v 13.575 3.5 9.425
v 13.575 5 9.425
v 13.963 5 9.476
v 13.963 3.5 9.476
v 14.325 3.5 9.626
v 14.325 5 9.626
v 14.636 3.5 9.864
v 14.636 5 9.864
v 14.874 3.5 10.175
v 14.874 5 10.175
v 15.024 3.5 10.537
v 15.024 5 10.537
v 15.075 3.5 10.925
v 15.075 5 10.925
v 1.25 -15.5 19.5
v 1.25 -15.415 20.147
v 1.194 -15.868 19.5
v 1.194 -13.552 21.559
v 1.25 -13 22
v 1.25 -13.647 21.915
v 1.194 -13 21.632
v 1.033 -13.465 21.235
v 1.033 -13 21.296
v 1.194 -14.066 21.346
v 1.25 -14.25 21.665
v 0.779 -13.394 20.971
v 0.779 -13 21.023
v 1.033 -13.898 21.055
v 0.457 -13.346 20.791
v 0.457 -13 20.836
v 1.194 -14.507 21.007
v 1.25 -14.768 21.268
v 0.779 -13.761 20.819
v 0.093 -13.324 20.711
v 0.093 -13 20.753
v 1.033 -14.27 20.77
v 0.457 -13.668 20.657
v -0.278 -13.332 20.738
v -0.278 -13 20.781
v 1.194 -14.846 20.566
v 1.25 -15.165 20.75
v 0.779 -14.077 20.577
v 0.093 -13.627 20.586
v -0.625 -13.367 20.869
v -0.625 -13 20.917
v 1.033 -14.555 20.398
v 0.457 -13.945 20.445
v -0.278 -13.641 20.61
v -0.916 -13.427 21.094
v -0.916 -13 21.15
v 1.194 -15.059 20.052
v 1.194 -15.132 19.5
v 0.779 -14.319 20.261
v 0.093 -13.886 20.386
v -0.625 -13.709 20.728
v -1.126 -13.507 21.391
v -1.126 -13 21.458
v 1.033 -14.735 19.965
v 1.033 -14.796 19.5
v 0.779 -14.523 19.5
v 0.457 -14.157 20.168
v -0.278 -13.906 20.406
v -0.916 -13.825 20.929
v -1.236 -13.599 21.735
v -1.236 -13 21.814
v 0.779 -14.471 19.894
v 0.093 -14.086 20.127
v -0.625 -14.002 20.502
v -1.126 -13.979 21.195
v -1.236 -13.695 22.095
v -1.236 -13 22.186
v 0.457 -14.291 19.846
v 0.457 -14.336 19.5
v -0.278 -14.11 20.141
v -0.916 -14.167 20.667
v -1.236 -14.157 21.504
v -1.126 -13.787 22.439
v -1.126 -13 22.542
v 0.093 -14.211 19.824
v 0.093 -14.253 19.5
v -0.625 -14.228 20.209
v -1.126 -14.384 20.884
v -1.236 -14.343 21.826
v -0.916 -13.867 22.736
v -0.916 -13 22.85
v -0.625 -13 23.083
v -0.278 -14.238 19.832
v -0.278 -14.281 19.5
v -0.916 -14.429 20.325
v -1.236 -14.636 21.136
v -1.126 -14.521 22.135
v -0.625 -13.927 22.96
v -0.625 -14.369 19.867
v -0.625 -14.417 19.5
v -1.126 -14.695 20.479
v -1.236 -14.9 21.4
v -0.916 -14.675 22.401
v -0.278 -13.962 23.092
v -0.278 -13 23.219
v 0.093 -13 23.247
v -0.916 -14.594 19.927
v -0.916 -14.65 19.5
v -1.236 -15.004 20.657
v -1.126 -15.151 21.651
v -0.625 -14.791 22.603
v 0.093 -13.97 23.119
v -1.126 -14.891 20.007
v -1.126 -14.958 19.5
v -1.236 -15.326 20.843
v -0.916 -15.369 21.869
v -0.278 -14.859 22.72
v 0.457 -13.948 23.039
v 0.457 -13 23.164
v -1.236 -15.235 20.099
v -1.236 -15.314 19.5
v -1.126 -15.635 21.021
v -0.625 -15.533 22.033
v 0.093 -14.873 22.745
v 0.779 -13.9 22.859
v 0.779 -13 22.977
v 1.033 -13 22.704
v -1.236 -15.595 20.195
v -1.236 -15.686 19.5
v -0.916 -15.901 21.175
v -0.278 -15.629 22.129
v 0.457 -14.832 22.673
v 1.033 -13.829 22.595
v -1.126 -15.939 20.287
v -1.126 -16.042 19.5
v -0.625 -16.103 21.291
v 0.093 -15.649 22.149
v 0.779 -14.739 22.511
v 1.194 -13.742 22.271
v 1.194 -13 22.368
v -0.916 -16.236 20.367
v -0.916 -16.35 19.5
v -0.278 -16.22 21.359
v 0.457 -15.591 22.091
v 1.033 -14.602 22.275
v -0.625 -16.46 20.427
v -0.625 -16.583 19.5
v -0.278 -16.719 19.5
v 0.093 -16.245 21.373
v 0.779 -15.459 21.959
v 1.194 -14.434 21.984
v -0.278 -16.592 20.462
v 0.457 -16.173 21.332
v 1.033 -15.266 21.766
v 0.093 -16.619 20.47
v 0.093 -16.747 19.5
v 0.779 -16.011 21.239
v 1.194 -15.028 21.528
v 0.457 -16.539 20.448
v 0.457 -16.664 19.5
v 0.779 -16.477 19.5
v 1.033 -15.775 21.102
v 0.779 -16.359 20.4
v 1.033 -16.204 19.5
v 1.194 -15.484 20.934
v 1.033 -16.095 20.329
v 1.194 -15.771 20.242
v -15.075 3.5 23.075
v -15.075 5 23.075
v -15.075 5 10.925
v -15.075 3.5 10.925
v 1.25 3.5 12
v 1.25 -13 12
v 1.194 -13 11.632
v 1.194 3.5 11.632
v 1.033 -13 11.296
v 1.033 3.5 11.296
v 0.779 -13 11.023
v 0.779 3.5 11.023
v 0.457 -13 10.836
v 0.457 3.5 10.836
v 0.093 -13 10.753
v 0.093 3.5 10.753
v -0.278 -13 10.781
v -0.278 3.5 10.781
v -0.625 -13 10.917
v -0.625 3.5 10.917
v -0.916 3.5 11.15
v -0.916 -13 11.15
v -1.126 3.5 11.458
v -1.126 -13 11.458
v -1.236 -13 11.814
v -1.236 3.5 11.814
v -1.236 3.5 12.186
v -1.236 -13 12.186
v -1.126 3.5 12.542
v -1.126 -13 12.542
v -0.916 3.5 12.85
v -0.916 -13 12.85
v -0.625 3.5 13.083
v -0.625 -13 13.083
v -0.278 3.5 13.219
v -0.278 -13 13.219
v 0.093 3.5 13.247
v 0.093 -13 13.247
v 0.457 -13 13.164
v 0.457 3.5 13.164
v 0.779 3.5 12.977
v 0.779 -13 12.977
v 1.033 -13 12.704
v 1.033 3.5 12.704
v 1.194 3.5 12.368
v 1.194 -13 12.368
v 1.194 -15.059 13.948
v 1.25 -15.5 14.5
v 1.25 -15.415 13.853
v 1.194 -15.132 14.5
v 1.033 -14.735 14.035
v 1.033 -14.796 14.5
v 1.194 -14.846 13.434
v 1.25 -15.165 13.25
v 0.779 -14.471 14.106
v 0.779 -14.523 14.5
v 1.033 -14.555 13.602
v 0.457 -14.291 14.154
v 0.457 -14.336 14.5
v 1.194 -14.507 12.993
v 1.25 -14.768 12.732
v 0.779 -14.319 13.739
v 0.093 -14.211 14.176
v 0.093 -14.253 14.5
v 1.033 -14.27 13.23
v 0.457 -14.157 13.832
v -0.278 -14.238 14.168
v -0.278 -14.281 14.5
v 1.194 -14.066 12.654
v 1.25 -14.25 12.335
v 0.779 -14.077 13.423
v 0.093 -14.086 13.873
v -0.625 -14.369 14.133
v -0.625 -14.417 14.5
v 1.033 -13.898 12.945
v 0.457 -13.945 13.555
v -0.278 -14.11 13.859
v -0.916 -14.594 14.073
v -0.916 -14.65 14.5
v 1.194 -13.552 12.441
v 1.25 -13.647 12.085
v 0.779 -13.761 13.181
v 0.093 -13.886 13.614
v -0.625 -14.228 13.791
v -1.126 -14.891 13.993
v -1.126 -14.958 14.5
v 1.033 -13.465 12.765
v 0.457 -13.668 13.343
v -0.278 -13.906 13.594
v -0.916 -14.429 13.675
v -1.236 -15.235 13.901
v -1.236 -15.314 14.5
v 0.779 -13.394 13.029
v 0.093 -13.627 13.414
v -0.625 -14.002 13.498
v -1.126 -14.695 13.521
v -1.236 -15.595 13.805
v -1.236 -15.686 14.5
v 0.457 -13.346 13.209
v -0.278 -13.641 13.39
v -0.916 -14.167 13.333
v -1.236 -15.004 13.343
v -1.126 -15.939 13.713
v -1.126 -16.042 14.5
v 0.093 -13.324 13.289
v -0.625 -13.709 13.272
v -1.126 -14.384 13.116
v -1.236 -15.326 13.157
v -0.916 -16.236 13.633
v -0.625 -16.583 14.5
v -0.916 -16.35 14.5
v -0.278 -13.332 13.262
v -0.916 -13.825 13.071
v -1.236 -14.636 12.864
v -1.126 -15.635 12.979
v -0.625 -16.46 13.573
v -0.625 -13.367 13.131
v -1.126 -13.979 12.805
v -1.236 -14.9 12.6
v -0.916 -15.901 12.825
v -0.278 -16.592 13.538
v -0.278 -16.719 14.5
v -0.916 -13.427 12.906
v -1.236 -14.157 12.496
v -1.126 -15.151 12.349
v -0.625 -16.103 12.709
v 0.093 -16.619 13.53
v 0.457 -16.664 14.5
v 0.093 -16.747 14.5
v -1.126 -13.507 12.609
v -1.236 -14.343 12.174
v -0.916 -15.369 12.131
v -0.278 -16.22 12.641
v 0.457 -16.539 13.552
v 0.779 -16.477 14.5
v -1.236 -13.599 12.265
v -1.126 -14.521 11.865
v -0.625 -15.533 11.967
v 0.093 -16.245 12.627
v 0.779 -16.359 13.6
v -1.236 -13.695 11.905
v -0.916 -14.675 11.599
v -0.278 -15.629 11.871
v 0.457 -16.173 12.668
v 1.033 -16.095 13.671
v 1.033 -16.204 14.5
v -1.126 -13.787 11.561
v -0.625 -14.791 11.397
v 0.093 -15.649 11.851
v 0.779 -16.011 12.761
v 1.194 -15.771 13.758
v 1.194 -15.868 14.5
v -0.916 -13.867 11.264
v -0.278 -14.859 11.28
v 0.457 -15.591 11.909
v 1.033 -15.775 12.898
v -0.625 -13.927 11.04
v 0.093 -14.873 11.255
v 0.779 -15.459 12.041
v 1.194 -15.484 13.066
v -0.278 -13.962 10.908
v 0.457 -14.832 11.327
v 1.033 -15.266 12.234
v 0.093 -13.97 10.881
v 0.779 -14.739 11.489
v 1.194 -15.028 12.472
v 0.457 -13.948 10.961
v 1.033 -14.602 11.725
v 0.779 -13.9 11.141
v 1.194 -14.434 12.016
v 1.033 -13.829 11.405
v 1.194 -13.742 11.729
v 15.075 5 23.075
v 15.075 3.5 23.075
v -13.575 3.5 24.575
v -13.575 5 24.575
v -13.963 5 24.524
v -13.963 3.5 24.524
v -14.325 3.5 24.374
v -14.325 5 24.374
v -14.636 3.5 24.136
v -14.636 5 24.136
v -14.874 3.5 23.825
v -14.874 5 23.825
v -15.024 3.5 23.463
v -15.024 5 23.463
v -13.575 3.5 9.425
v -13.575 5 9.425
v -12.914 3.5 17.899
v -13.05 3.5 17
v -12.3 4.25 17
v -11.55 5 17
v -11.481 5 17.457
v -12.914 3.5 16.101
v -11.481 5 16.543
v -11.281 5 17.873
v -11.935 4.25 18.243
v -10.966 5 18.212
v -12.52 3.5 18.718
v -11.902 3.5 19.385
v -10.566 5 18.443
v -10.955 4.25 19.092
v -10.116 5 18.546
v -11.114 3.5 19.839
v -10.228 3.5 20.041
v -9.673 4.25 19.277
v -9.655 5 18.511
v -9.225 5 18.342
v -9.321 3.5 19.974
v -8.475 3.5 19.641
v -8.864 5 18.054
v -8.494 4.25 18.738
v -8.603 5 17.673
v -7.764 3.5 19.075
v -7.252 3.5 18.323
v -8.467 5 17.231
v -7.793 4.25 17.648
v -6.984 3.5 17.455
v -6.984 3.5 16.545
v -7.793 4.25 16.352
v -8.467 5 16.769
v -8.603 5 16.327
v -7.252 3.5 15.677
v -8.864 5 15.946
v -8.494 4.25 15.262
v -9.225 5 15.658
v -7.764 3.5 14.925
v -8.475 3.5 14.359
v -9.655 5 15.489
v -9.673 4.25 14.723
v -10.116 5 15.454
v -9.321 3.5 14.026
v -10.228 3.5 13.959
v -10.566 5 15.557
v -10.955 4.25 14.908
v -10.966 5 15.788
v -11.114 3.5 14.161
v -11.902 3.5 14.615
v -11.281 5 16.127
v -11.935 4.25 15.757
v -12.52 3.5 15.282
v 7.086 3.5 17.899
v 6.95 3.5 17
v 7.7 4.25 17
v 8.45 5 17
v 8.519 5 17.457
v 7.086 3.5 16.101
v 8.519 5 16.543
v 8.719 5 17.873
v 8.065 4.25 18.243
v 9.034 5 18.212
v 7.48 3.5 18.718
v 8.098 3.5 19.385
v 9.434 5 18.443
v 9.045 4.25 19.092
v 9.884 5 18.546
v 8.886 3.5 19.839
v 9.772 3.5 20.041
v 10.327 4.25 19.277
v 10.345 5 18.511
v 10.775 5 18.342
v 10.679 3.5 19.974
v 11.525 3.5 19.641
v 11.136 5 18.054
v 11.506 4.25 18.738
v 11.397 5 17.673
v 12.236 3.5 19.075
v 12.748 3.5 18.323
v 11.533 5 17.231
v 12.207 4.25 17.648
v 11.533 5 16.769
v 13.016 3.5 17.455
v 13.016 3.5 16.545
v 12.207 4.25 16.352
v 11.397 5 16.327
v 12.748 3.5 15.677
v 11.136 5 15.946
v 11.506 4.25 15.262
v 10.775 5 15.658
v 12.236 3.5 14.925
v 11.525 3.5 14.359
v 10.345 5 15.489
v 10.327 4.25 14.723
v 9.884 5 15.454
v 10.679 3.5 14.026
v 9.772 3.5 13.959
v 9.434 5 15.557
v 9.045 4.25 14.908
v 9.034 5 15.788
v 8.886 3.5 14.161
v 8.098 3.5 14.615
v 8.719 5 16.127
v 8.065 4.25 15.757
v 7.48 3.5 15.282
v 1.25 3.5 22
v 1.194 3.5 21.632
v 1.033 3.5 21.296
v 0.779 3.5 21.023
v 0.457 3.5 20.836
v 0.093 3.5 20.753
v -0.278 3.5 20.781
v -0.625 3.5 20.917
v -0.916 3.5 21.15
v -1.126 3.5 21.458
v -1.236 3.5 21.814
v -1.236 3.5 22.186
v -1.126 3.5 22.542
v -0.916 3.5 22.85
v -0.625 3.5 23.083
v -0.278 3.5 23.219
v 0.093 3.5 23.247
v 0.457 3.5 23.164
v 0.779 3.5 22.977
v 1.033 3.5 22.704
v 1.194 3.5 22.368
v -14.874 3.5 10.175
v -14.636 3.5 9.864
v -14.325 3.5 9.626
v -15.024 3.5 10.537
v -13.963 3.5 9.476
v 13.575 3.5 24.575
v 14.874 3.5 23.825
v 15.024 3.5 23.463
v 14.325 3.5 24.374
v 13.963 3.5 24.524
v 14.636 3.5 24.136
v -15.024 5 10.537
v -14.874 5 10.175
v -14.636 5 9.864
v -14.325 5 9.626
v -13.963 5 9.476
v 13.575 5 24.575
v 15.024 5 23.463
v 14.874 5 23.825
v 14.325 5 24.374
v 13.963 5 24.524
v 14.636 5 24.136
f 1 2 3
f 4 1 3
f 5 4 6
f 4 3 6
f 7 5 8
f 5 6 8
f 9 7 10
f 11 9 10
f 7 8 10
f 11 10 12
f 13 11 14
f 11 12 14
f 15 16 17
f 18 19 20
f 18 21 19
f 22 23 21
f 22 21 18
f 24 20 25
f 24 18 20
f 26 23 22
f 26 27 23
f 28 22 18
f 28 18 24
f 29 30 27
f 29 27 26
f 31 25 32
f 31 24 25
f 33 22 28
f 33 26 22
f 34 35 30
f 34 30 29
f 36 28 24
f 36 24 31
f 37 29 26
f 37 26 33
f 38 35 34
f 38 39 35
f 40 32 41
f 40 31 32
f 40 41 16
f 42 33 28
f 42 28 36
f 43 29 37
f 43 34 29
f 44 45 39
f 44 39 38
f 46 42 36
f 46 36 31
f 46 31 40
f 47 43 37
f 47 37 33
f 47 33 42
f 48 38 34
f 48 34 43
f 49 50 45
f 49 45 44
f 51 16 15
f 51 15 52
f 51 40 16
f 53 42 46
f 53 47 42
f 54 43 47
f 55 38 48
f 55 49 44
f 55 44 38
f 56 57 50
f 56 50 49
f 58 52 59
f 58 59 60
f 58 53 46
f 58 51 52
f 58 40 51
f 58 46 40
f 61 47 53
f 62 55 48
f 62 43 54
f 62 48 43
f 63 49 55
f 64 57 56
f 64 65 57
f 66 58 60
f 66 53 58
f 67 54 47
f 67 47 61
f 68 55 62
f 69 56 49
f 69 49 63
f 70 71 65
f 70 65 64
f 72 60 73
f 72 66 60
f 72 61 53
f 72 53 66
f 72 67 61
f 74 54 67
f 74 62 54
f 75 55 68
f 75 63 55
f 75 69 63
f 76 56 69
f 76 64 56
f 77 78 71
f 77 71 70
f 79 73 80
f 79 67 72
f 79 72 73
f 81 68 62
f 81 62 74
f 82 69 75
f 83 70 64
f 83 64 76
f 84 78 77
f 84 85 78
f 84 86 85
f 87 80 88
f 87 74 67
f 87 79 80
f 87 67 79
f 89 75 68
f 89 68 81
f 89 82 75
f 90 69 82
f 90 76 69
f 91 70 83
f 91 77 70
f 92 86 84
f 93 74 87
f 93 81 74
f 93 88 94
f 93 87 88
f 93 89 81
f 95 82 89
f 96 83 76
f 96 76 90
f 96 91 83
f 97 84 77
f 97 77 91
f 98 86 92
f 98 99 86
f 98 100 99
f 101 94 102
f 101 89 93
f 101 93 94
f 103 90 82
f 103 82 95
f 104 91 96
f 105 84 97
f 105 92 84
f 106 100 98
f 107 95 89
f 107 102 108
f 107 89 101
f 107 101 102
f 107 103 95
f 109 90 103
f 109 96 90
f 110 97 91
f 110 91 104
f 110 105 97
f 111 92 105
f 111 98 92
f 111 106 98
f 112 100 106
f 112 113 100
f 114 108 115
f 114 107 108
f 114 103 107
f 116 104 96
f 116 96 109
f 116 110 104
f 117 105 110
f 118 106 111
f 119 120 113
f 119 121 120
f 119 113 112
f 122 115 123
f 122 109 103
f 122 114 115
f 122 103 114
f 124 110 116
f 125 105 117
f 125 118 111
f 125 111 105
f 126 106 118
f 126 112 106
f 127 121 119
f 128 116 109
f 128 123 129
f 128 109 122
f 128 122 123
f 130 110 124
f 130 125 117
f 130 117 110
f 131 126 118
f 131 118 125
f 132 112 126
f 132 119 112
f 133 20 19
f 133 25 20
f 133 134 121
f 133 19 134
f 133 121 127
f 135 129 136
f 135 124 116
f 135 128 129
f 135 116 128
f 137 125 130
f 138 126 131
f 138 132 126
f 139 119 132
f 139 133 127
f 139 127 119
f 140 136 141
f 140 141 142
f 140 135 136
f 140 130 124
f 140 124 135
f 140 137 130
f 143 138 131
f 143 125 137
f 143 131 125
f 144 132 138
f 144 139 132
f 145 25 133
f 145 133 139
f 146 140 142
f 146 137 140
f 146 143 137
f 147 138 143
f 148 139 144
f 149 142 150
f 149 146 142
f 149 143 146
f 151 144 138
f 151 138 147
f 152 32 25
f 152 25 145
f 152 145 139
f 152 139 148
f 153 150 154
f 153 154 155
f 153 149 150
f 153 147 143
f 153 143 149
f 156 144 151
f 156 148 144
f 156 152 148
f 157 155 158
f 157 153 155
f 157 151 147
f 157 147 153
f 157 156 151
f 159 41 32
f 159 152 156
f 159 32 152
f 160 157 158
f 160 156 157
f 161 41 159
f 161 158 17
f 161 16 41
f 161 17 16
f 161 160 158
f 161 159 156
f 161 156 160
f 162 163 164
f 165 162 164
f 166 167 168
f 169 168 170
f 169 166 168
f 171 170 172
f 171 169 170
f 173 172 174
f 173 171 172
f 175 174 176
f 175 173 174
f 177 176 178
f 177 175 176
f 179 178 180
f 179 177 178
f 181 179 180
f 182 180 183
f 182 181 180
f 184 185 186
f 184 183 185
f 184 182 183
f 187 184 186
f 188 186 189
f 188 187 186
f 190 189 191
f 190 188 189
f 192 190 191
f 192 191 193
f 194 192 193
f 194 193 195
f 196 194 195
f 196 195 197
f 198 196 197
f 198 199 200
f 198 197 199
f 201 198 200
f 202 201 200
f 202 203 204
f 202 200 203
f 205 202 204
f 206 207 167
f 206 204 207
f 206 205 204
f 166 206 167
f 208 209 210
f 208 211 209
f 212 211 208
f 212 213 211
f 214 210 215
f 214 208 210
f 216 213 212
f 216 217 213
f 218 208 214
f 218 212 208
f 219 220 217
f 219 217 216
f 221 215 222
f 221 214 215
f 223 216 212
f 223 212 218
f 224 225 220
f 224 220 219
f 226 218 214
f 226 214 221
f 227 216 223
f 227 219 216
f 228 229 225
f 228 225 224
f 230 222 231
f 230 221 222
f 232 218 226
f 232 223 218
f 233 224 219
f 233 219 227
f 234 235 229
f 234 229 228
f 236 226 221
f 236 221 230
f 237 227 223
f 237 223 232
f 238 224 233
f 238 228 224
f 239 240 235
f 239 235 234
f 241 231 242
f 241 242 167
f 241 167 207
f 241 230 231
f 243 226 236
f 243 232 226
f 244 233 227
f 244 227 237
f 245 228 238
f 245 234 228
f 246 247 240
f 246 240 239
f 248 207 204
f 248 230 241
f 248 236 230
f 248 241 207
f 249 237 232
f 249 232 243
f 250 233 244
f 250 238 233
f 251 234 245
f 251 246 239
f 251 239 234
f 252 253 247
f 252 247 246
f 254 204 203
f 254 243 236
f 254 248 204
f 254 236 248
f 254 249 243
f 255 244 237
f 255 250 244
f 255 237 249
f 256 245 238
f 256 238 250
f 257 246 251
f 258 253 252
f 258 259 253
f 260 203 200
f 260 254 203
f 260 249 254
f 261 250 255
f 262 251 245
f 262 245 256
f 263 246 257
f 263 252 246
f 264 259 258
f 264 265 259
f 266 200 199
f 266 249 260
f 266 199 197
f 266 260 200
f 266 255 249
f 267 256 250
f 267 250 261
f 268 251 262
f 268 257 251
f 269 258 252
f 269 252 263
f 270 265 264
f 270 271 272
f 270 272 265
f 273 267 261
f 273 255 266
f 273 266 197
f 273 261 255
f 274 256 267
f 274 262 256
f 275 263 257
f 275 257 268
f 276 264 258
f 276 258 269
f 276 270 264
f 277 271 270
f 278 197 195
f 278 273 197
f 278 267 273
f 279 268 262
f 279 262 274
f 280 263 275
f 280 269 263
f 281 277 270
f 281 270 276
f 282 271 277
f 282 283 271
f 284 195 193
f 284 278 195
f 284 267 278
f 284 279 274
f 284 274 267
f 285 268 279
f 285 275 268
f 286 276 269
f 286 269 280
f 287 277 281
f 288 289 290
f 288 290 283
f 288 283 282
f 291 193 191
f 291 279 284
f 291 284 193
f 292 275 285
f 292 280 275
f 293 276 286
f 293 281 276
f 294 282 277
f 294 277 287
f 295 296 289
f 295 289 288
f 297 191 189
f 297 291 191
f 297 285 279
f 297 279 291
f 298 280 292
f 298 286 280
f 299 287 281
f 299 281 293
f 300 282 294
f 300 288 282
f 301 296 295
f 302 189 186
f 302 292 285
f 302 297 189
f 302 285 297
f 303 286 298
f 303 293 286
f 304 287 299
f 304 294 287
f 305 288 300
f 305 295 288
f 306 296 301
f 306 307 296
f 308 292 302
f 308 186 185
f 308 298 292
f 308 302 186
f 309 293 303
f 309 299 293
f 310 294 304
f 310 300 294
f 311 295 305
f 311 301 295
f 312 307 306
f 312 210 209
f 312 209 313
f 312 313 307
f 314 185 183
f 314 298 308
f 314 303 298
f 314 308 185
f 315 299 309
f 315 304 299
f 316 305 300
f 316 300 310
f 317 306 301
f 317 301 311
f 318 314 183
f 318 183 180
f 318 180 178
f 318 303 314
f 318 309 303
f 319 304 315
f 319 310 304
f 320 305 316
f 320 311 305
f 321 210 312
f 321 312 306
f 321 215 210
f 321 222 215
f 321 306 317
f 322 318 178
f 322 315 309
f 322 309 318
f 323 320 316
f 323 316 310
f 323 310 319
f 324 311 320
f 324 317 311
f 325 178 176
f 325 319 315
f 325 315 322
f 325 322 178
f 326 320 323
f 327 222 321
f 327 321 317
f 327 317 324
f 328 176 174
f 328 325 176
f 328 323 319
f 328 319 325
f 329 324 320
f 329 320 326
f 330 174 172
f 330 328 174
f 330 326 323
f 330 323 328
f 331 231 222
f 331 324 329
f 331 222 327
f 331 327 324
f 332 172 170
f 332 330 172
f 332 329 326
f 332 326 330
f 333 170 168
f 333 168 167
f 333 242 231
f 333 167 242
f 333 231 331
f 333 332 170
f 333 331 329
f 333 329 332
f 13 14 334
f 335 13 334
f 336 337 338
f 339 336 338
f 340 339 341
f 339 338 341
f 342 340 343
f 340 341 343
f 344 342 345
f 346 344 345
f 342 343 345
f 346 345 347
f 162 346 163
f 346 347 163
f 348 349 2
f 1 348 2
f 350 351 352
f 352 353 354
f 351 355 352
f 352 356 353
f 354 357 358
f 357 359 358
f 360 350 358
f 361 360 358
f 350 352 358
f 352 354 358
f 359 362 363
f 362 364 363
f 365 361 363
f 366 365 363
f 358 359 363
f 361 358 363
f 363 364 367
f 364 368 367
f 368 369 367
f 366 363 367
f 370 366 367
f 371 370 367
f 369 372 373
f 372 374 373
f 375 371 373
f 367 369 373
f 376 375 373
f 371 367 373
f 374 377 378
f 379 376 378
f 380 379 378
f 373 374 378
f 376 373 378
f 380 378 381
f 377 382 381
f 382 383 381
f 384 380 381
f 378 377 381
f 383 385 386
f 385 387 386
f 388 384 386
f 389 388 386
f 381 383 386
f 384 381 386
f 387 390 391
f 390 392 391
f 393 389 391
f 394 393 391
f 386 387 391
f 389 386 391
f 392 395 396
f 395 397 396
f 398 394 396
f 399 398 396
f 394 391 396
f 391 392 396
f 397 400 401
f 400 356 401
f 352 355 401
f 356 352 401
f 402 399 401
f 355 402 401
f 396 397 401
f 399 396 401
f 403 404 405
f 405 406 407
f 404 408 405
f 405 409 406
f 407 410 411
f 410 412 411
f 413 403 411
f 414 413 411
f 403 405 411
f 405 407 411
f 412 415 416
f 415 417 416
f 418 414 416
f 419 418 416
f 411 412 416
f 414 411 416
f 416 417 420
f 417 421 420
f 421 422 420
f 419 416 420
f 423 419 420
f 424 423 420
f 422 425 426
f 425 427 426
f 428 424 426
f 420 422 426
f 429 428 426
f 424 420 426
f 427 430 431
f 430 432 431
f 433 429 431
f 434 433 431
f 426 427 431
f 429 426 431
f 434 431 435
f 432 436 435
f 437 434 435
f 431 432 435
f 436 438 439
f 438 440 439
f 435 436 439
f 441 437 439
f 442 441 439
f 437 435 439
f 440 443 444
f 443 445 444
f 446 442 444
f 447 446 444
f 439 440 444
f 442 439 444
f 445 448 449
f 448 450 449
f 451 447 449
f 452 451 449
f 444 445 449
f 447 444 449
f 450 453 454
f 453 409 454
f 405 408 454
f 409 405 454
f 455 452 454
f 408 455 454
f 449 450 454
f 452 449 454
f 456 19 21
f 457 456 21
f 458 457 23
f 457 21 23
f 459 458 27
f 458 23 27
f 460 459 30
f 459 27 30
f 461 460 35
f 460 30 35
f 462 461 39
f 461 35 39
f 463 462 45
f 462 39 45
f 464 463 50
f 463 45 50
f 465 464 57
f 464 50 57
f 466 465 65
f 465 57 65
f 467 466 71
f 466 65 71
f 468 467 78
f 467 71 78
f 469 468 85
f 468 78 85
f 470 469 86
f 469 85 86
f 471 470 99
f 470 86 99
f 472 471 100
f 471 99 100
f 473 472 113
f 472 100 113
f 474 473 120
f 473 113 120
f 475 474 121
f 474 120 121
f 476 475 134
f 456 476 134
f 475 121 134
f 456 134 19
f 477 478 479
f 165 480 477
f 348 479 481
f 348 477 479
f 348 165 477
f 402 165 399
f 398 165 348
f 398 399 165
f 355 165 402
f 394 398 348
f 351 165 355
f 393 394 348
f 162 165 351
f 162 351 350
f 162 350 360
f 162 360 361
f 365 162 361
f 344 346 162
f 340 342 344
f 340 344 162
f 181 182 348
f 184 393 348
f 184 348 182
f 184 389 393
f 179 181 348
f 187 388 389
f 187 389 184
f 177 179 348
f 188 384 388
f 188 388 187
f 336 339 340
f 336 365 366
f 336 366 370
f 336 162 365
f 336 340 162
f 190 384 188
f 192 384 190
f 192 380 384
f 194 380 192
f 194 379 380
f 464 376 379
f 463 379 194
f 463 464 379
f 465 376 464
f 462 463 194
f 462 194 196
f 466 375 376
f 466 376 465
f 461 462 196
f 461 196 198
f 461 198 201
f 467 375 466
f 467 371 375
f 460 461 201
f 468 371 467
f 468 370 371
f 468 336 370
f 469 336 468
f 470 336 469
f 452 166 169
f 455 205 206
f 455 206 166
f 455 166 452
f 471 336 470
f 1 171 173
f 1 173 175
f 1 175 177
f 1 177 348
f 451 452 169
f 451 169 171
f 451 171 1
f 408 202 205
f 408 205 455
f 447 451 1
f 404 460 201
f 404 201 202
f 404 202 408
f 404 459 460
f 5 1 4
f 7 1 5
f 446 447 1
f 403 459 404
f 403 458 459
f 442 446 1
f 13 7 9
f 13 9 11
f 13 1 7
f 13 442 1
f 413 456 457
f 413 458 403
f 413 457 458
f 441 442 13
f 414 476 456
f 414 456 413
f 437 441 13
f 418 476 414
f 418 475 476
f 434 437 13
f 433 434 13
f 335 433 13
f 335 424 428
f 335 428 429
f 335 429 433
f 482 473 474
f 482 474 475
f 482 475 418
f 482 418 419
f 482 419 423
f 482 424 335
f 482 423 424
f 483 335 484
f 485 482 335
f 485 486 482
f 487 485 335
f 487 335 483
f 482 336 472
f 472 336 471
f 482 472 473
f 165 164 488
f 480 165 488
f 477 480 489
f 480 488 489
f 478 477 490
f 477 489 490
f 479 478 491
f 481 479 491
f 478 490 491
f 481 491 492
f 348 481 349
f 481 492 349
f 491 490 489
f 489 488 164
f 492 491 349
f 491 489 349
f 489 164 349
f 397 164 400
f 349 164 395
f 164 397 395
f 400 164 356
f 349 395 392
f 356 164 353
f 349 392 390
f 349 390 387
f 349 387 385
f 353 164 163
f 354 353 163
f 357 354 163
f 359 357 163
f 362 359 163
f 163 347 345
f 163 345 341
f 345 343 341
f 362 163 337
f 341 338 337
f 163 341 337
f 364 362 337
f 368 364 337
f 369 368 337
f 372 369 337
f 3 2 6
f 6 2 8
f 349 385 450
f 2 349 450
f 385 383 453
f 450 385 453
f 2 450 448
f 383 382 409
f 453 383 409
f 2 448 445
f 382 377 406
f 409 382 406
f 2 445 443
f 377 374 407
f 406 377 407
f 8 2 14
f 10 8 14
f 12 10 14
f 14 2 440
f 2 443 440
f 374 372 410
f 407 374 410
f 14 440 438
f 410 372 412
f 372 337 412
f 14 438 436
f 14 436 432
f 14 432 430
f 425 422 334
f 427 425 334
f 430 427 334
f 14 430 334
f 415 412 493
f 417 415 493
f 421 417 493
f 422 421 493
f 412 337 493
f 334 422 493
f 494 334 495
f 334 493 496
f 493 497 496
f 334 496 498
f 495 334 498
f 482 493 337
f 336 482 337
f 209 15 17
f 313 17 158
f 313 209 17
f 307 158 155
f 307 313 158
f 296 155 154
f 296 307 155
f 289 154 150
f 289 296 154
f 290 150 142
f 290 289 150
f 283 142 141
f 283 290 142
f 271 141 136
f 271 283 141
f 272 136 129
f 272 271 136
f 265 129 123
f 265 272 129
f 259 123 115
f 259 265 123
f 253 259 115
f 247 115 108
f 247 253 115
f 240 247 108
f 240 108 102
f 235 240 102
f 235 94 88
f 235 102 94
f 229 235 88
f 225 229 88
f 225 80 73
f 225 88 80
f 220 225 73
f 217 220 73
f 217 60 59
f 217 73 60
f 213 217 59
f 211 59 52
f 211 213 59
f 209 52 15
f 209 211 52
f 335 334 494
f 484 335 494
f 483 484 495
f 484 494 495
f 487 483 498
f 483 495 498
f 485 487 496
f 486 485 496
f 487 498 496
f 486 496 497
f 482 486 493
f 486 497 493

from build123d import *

# Parameters (mm, degrees)
PAD003_DEPTH        = 1.5
HOLE001_D           = 3
HOLE001_DEPTH       = 25
HOLE001_CSINK_D     = 6.1
HOLE001_CSINK_ANGLE = 90
SKETCH009_R         = 1.25


with BuildPart() as part:
    # Sketch006 → Pad003 (new body)
    with BuildSketch(Plane.XZ):
        with BuildLine():
            Line((-15.075, 6.075), (-15.075, -6.075))
            ThreePointArc((-15.075, -6.075), (-14.63566, -7.13566), (-13.575, -7.575))
            Line((-13.575, -7.575), (13.575, -7.575))
            ThreePointArc((13.575, -7.575), (14.63566, -7.13566), (15.075, -6.075))
            Line((15.075, -6.075), (15.075, 6.075))
            ThreePointArc((15.075, 6.075), (14.63566, 7.13566), (13.575, 7.575))
            Line((13.575, 7.575), (-13.575, 7.575))
            ThreePointArc((-13.575, 7.575), (-14.63566, 7.13566), (-15.075, 6.075))
        make_face()
    extrude(amount=PAD003_DEPTH)

    # Hole001
    with Locations(Plane.XZ.offset(1.5)):
        with Locations((-10, 0), (10, 0)):
            CounterSinkHole(HOLE001_D / 2, HOLE001_CSINK_D / 2, depth=HOLE001_DEPTH, counter_sink_angle=HOLE001_CSINK_ANGLE)

    # AdditivePipe: sweep along a path in Sketch008
    with BuildLine(Plane.YZ) as additivepipe_path:
        Line((-1.5, 5), (-18, 5))
        ThreePointArc((-18, 5), (-19.767767, 4.267767), (-20.5, 2.5))
        Line((-20.5, 2.5), (-20.5, -2.5))
        ThreePointArc((-20.5, -2.5), (-19.767767, -4.267767), (-18, -5))
        Line((-18, -5), (-1.5, -5))
    # Sketch009 (on Face5 of Hole001) → AdditivePipe (sweep)
    with BuildSketch(Plane.XZ.offset(1.5)):
        with Locations((0, -5)):
            Circle(SKETCH009_R)
    sweep(path=additivepipe_path.line)


with BuildPart() as part_1:
    # Body001 placement: moved
    add(part.part.moved(Location((0, 5, 17))))


solid = part_1.part
